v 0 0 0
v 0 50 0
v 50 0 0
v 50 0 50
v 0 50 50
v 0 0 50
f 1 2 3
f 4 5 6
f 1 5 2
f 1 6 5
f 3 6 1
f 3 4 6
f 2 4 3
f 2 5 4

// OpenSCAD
// Generated by CadMonkey
// Prompt: hey cadmonkey, create me a pyramid
// Generated at: 2025-11-10 16:48:57

module pyramid(base_size, height) {
  linear_extrude(height = base_size)
    polygon(points=[
      [0,0],
      [base_size, 0],
      [base_size/2, base_size/2],
      [0, base_size]
    ]);
}

pyramid(50, 30);
